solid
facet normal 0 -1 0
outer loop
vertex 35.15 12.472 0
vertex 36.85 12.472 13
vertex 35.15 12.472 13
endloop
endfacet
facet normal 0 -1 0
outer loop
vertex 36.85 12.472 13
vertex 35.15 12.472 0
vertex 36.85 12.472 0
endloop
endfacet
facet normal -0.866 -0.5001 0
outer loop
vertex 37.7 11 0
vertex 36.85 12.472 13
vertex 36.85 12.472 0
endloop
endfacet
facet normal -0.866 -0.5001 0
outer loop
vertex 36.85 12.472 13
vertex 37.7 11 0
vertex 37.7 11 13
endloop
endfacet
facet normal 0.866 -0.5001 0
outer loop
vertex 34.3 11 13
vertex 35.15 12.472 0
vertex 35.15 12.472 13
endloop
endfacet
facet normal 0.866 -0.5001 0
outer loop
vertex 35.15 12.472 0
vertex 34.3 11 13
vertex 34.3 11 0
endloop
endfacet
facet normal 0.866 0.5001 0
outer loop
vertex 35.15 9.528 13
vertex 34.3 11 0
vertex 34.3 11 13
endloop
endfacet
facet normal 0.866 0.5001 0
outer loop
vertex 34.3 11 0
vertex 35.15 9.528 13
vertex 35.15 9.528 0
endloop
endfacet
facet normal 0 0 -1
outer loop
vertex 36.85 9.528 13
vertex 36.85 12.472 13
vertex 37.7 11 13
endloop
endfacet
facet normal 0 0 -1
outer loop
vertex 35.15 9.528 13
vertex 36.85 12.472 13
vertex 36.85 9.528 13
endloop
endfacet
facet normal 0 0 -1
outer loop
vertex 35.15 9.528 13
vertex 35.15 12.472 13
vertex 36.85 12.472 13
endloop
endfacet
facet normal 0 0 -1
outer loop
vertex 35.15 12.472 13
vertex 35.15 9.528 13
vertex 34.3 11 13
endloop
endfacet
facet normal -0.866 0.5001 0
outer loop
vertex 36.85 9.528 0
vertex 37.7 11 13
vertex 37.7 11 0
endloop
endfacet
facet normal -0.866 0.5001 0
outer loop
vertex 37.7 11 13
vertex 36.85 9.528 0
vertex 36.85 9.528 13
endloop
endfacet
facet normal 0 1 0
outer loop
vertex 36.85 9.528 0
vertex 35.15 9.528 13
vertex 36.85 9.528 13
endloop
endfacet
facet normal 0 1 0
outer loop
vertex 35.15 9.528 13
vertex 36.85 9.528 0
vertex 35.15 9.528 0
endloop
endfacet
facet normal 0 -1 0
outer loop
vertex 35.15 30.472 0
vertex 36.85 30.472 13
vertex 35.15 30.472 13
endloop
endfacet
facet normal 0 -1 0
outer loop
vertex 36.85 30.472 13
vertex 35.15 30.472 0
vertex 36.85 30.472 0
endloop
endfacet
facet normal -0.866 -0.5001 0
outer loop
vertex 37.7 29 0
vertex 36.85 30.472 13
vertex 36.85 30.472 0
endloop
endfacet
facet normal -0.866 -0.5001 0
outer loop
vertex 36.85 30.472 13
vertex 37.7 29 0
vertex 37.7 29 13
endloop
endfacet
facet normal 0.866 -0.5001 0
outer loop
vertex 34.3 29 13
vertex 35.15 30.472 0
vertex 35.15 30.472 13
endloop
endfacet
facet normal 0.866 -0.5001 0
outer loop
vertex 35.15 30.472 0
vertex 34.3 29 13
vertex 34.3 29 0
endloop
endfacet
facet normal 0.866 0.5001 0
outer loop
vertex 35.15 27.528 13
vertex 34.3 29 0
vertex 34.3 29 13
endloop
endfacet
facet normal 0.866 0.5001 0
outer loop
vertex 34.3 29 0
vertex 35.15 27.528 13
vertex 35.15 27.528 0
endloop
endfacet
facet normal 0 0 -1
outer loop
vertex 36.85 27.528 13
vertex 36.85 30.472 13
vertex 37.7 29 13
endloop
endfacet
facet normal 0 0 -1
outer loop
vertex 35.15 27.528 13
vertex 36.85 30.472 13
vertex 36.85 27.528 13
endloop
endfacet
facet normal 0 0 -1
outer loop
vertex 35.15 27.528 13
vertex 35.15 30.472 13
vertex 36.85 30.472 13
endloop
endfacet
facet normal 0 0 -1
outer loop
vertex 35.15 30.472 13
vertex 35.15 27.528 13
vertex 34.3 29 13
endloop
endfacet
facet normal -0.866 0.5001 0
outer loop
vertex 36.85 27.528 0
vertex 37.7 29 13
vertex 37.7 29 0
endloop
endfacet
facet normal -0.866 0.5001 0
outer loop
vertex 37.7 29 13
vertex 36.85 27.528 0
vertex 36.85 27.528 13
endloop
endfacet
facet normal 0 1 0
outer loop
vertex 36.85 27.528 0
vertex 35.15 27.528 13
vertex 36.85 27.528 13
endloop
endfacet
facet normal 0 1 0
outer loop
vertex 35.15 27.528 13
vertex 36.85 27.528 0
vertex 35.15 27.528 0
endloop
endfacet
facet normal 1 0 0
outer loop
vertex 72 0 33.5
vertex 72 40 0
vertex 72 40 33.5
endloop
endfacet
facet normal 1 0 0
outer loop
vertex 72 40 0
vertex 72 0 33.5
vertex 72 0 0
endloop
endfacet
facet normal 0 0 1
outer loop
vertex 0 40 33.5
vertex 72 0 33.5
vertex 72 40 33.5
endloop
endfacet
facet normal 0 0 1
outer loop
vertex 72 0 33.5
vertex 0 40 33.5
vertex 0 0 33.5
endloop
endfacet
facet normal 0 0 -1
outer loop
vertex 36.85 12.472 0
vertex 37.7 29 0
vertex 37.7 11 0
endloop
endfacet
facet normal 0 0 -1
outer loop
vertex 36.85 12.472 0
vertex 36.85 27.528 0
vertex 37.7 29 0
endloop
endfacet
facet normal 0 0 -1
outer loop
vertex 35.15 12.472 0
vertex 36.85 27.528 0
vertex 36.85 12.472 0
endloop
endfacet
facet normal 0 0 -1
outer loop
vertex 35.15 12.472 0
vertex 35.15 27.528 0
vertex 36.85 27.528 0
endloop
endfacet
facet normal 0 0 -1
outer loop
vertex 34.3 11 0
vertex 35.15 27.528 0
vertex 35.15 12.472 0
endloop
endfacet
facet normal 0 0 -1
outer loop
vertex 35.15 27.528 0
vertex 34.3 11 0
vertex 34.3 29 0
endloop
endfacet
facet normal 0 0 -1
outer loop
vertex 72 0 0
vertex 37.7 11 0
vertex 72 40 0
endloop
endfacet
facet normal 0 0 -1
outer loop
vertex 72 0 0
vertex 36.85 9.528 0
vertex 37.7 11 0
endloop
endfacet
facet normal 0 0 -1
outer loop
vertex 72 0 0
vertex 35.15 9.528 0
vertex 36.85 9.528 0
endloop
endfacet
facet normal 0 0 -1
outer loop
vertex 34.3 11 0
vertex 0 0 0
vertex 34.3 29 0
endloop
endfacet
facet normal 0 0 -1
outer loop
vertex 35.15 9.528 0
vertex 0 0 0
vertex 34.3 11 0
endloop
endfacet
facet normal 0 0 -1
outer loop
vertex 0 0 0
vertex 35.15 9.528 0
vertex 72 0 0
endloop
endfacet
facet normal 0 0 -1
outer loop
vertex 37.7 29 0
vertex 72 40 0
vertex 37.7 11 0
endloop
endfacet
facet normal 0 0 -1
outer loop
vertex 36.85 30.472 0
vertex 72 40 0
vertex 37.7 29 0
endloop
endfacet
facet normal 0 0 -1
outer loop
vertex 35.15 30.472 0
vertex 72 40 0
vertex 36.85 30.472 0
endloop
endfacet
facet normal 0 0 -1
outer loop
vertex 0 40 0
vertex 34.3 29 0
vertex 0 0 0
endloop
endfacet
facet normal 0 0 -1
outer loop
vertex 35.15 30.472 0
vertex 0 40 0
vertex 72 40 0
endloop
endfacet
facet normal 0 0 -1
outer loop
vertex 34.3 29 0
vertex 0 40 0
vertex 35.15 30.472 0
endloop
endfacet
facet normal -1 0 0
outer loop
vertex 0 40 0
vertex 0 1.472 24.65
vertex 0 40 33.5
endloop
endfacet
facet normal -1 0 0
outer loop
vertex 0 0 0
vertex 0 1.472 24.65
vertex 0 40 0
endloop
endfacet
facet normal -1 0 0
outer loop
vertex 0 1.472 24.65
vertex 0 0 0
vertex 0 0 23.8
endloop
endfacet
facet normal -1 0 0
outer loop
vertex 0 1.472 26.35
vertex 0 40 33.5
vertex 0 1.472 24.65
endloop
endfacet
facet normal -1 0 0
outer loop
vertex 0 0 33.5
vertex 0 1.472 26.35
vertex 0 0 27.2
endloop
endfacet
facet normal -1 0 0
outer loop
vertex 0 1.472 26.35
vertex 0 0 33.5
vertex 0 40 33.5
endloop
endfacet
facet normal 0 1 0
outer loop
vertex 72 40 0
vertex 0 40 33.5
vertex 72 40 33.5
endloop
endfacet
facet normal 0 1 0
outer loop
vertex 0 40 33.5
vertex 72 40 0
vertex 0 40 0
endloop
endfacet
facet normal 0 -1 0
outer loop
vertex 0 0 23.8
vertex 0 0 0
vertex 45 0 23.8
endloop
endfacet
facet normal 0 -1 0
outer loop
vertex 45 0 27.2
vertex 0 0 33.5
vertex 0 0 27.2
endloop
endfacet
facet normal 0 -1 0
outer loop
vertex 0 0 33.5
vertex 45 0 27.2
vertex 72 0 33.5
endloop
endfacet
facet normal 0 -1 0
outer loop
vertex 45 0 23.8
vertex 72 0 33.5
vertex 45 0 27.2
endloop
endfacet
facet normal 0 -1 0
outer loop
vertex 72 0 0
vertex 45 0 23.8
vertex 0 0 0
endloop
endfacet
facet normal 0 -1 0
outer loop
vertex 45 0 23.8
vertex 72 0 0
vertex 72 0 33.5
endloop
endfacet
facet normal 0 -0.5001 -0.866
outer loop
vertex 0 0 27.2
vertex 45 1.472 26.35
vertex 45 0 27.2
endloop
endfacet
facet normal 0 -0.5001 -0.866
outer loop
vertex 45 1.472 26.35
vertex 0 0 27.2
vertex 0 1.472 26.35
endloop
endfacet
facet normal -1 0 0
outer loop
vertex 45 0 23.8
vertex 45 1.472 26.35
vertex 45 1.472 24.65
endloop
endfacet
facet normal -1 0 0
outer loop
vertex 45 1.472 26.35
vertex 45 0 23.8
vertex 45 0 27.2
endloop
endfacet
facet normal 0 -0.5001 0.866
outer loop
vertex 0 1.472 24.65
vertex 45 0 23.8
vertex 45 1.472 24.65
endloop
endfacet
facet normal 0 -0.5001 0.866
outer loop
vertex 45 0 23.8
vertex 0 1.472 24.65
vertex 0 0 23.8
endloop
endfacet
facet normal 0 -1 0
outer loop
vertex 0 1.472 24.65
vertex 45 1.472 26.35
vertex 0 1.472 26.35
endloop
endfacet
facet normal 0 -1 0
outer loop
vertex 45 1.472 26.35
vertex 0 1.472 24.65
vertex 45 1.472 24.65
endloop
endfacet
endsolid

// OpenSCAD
// Printable 1:1 physical alignment gauge. The horizontal line through the
// 3 mm D-bore target is exactly motor_axis_z above the underside.
motor_axis_z = 25.5;
difference() {
    cube([72, 40, motor_axis_z + 8], center = false);
    translate([0, 0, motor_axis_z]) rotate([0, 90, 0]) cylinder(d = 3.4, h = 90, center = true);
    for (y = [11, 29]) translate([36, y, 5]) cylinder(d = 3.4, h = 16, center = true);
}
